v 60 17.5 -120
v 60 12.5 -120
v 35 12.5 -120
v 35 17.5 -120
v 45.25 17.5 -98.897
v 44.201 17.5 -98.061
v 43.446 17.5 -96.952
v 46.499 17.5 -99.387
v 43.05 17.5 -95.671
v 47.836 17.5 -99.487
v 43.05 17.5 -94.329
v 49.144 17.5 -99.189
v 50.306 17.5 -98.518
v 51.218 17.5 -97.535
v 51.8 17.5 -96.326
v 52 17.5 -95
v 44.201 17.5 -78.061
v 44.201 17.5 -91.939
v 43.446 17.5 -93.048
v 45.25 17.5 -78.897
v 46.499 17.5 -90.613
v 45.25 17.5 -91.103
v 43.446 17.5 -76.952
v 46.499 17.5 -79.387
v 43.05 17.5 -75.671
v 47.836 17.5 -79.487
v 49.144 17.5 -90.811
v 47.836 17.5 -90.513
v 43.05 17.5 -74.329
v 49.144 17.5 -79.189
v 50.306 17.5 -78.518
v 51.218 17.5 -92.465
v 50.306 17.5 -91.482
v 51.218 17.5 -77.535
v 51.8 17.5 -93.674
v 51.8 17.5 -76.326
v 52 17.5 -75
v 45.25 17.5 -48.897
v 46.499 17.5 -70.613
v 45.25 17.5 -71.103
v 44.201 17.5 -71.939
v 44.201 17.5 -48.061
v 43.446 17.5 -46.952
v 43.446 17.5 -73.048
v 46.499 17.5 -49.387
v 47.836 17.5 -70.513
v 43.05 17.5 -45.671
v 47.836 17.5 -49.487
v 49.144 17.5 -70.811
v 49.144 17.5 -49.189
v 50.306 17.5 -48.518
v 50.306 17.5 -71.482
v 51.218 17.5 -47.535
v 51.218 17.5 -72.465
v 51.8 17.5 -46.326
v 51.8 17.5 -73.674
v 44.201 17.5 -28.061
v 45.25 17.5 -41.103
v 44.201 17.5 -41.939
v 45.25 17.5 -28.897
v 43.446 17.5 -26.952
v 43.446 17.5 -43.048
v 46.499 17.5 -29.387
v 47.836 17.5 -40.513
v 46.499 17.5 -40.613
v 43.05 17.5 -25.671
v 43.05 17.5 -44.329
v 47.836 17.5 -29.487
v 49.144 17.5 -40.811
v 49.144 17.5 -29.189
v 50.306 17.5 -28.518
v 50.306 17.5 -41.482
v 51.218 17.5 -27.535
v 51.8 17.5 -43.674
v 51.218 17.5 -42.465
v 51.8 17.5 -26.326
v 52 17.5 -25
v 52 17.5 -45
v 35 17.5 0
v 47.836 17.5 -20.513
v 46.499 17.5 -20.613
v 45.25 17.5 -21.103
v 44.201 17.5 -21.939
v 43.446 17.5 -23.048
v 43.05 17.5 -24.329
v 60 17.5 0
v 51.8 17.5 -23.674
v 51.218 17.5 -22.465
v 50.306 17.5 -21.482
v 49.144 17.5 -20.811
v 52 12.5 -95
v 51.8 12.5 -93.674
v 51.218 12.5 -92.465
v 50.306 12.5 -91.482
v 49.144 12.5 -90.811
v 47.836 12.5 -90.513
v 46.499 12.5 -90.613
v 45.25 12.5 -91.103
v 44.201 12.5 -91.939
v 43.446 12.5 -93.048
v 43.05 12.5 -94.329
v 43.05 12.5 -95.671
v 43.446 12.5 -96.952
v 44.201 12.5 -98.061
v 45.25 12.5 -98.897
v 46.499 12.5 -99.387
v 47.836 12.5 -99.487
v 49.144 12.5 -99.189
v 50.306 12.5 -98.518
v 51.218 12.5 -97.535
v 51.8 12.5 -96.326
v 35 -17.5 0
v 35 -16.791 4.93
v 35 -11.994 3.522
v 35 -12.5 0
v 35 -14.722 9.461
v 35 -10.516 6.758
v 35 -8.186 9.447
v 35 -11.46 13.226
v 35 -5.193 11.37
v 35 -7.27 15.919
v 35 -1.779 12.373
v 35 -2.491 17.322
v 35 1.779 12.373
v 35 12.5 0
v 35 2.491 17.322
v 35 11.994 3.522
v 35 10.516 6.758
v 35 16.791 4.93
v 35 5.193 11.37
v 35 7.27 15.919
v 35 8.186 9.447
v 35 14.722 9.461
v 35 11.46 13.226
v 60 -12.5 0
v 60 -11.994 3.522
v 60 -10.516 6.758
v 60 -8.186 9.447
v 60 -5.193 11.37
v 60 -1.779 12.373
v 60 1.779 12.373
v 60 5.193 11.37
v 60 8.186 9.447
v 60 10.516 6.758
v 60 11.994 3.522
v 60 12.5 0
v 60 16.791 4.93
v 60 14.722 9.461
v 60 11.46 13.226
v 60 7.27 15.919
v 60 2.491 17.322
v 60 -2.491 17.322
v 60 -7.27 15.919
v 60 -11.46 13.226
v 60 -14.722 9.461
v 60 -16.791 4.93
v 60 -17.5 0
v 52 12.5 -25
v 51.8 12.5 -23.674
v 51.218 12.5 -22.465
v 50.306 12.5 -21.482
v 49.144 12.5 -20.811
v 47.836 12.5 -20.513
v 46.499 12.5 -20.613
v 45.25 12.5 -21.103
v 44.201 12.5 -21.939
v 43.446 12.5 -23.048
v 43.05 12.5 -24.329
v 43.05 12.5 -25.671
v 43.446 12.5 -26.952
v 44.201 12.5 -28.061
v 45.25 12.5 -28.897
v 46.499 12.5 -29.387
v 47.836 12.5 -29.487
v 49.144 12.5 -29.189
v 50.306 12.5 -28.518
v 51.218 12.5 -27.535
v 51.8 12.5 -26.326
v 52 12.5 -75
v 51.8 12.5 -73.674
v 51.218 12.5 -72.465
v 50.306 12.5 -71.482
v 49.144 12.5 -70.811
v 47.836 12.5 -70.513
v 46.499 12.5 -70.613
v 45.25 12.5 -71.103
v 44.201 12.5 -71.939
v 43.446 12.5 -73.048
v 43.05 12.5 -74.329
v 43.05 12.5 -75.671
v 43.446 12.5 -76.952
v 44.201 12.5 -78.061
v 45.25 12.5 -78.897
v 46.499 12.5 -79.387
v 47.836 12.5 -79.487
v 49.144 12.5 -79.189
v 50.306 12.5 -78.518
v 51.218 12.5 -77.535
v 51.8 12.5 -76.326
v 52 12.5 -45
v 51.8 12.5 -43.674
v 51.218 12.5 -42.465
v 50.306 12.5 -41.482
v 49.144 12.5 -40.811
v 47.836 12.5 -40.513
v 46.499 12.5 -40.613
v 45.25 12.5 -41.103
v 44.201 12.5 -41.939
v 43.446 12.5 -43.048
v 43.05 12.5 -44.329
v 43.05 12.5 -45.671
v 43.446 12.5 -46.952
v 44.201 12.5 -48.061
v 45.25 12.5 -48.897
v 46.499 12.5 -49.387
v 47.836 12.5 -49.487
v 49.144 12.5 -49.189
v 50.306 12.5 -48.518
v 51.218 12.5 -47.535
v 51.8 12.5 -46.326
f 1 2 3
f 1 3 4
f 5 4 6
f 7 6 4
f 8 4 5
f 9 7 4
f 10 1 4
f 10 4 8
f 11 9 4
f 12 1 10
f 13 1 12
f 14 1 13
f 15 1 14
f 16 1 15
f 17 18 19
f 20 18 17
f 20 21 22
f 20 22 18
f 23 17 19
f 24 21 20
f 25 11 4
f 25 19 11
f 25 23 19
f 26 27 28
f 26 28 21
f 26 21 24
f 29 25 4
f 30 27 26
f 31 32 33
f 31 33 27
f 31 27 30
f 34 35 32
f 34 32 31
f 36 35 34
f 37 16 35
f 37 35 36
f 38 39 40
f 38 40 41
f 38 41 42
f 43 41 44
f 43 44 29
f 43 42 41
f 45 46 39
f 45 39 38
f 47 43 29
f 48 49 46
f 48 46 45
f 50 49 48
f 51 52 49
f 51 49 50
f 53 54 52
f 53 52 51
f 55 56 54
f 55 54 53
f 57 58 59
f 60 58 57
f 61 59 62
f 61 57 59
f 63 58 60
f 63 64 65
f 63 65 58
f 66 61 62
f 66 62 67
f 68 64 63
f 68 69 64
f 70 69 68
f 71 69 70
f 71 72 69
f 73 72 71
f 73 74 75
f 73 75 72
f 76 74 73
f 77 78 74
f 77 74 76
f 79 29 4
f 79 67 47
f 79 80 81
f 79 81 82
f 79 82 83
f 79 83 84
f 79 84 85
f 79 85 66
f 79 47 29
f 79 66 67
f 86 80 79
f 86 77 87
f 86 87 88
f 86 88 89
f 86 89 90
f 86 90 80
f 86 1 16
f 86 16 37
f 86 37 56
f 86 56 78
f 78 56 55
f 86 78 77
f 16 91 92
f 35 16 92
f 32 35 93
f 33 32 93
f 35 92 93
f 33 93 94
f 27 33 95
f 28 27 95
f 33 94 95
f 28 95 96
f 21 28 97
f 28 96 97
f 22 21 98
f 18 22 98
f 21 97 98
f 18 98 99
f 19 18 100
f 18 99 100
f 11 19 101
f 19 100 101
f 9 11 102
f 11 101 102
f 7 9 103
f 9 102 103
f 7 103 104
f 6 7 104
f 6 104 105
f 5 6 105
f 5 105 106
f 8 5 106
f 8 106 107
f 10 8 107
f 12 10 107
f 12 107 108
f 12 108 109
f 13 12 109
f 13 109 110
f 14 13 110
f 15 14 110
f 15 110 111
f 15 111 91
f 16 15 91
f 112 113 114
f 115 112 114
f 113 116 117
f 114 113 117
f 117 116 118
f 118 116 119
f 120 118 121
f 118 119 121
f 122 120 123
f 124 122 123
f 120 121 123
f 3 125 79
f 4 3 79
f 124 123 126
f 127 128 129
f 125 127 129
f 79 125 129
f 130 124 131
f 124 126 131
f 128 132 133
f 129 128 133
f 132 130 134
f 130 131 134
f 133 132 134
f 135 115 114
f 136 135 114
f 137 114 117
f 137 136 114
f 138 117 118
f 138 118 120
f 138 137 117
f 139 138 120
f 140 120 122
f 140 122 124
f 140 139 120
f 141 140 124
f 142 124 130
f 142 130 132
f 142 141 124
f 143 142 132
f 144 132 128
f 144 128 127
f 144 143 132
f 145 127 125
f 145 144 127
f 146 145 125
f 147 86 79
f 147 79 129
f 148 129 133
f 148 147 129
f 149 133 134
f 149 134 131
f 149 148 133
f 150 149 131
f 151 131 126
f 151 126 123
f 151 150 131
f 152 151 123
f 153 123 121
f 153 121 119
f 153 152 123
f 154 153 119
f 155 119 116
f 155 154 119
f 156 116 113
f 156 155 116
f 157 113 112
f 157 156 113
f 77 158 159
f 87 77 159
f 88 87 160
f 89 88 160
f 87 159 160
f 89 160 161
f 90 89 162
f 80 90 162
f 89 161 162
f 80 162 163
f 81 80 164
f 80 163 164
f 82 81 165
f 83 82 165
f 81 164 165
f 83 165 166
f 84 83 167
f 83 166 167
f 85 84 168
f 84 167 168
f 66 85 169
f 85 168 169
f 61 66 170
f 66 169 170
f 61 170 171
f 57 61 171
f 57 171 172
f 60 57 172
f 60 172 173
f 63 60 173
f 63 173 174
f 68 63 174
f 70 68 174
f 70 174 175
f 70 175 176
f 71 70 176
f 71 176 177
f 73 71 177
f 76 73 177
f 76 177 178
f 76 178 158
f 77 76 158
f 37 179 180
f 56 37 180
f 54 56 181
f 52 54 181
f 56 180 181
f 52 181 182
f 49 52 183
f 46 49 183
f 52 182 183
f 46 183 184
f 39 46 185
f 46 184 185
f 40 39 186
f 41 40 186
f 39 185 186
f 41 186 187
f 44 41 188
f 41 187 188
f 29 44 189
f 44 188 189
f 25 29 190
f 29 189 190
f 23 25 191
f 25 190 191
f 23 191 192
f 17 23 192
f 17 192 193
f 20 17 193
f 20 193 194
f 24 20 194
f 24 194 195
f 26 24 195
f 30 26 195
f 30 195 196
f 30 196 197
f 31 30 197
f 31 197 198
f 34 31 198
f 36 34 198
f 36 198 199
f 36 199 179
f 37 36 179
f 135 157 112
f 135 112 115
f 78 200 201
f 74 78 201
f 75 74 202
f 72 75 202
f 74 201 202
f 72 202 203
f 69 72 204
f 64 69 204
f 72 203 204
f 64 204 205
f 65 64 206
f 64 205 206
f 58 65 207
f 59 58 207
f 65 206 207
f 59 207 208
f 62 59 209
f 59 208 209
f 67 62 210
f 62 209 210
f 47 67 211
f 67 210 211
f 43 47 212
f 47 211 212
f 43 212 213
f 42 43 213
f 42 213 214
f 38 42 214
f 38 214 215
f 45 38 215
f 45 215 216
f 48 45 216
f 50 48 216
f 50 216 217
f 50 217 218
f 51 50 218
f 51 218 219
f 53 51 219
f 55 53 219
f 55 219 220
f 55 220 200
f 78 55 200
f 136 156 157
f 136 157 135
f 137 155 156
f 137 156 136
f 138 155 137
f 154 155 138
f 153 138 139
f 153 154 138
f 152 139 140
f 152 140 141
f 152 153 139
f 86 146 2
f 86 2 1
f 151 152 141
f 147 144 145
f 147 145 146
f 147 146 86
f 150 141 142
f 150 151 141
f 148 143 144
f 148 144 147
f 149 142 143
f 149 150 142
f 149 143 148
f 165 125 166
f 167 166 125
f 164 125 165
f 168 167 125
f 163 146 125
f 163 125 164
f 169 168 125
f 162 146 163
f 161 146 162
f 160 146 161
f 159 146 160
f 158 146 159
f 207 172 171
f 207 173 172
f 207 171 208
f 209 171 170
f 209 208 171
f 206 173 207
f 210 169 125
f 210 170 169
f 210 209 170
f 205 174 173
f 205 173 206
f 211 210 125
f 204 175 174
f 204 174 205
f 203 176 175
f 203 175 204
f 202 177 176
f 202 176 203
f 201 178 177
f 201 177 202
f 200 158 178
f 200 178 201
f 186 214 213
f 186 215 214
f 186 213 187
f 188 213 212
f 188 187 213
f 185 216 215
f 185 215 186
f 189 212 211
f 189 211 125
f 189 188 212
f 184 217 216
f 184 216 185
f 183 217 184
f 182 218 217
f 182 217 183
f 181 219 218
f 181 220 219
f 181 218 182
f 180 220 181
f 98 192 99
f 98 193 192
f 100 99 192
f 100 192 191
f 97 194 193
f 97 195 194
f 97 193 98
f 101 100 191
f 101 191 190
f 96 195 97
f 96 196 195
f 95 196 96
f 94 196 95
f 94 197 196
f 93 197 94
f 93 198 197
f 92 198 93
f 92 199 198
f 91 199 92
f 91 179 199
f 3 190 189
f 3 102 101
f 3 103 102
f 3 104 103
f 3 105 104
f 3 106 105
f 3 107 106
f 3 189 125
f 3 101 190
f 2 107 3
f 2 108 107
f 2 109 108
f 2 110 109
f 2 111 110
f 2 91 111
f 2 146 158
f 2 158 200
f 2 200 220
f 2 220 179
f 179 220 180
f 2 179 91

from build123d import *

# Parameters (mm, degrees)
F2_DEPTH = 25
F4_D     = 9
F6_D     = 9


with BuildPart() as f2:
    # F1 (on offset) → F2 (new body)
    with BuildSketch(Plane.YZ.offset(60)):
        with BuildLine():
            ThreePointArc((-12.5, 0), (0, 12.5), (12.5, 0))
            Line((12.5, 0), (12.5, -120))
            Line((12.5, -120), (17.5, -120))
            Line((17.5, -120), (17.5, 0))
            ThreePointArc((17.5, 0), (0, 17.5), (-17.5, 0))
            Line((-17.5, 0), (-12.5, 0))
        make_face()
    extrude(amount=-F2_DEPTH)

    # F4 (through all)
    with Locations(Plane(origin=(0, 17.5, 0), x_dir=(-1, 0, 0), z_dir=(0, 1, 0))):
        with Locations((-47.5, -25), (-47.5, -45)):
            Hole(F4_D / 2)

    # F6 (through all)
    with Locations(Plane(origin=(0, 17.5, 0), x_dir=(-1, 0, 0), z_dir=(0, 1, 0))):
        with Locations((-47.5, -75), (-47.5, -95)):
            Hole(F6_D / 2)


solid = f2.part
